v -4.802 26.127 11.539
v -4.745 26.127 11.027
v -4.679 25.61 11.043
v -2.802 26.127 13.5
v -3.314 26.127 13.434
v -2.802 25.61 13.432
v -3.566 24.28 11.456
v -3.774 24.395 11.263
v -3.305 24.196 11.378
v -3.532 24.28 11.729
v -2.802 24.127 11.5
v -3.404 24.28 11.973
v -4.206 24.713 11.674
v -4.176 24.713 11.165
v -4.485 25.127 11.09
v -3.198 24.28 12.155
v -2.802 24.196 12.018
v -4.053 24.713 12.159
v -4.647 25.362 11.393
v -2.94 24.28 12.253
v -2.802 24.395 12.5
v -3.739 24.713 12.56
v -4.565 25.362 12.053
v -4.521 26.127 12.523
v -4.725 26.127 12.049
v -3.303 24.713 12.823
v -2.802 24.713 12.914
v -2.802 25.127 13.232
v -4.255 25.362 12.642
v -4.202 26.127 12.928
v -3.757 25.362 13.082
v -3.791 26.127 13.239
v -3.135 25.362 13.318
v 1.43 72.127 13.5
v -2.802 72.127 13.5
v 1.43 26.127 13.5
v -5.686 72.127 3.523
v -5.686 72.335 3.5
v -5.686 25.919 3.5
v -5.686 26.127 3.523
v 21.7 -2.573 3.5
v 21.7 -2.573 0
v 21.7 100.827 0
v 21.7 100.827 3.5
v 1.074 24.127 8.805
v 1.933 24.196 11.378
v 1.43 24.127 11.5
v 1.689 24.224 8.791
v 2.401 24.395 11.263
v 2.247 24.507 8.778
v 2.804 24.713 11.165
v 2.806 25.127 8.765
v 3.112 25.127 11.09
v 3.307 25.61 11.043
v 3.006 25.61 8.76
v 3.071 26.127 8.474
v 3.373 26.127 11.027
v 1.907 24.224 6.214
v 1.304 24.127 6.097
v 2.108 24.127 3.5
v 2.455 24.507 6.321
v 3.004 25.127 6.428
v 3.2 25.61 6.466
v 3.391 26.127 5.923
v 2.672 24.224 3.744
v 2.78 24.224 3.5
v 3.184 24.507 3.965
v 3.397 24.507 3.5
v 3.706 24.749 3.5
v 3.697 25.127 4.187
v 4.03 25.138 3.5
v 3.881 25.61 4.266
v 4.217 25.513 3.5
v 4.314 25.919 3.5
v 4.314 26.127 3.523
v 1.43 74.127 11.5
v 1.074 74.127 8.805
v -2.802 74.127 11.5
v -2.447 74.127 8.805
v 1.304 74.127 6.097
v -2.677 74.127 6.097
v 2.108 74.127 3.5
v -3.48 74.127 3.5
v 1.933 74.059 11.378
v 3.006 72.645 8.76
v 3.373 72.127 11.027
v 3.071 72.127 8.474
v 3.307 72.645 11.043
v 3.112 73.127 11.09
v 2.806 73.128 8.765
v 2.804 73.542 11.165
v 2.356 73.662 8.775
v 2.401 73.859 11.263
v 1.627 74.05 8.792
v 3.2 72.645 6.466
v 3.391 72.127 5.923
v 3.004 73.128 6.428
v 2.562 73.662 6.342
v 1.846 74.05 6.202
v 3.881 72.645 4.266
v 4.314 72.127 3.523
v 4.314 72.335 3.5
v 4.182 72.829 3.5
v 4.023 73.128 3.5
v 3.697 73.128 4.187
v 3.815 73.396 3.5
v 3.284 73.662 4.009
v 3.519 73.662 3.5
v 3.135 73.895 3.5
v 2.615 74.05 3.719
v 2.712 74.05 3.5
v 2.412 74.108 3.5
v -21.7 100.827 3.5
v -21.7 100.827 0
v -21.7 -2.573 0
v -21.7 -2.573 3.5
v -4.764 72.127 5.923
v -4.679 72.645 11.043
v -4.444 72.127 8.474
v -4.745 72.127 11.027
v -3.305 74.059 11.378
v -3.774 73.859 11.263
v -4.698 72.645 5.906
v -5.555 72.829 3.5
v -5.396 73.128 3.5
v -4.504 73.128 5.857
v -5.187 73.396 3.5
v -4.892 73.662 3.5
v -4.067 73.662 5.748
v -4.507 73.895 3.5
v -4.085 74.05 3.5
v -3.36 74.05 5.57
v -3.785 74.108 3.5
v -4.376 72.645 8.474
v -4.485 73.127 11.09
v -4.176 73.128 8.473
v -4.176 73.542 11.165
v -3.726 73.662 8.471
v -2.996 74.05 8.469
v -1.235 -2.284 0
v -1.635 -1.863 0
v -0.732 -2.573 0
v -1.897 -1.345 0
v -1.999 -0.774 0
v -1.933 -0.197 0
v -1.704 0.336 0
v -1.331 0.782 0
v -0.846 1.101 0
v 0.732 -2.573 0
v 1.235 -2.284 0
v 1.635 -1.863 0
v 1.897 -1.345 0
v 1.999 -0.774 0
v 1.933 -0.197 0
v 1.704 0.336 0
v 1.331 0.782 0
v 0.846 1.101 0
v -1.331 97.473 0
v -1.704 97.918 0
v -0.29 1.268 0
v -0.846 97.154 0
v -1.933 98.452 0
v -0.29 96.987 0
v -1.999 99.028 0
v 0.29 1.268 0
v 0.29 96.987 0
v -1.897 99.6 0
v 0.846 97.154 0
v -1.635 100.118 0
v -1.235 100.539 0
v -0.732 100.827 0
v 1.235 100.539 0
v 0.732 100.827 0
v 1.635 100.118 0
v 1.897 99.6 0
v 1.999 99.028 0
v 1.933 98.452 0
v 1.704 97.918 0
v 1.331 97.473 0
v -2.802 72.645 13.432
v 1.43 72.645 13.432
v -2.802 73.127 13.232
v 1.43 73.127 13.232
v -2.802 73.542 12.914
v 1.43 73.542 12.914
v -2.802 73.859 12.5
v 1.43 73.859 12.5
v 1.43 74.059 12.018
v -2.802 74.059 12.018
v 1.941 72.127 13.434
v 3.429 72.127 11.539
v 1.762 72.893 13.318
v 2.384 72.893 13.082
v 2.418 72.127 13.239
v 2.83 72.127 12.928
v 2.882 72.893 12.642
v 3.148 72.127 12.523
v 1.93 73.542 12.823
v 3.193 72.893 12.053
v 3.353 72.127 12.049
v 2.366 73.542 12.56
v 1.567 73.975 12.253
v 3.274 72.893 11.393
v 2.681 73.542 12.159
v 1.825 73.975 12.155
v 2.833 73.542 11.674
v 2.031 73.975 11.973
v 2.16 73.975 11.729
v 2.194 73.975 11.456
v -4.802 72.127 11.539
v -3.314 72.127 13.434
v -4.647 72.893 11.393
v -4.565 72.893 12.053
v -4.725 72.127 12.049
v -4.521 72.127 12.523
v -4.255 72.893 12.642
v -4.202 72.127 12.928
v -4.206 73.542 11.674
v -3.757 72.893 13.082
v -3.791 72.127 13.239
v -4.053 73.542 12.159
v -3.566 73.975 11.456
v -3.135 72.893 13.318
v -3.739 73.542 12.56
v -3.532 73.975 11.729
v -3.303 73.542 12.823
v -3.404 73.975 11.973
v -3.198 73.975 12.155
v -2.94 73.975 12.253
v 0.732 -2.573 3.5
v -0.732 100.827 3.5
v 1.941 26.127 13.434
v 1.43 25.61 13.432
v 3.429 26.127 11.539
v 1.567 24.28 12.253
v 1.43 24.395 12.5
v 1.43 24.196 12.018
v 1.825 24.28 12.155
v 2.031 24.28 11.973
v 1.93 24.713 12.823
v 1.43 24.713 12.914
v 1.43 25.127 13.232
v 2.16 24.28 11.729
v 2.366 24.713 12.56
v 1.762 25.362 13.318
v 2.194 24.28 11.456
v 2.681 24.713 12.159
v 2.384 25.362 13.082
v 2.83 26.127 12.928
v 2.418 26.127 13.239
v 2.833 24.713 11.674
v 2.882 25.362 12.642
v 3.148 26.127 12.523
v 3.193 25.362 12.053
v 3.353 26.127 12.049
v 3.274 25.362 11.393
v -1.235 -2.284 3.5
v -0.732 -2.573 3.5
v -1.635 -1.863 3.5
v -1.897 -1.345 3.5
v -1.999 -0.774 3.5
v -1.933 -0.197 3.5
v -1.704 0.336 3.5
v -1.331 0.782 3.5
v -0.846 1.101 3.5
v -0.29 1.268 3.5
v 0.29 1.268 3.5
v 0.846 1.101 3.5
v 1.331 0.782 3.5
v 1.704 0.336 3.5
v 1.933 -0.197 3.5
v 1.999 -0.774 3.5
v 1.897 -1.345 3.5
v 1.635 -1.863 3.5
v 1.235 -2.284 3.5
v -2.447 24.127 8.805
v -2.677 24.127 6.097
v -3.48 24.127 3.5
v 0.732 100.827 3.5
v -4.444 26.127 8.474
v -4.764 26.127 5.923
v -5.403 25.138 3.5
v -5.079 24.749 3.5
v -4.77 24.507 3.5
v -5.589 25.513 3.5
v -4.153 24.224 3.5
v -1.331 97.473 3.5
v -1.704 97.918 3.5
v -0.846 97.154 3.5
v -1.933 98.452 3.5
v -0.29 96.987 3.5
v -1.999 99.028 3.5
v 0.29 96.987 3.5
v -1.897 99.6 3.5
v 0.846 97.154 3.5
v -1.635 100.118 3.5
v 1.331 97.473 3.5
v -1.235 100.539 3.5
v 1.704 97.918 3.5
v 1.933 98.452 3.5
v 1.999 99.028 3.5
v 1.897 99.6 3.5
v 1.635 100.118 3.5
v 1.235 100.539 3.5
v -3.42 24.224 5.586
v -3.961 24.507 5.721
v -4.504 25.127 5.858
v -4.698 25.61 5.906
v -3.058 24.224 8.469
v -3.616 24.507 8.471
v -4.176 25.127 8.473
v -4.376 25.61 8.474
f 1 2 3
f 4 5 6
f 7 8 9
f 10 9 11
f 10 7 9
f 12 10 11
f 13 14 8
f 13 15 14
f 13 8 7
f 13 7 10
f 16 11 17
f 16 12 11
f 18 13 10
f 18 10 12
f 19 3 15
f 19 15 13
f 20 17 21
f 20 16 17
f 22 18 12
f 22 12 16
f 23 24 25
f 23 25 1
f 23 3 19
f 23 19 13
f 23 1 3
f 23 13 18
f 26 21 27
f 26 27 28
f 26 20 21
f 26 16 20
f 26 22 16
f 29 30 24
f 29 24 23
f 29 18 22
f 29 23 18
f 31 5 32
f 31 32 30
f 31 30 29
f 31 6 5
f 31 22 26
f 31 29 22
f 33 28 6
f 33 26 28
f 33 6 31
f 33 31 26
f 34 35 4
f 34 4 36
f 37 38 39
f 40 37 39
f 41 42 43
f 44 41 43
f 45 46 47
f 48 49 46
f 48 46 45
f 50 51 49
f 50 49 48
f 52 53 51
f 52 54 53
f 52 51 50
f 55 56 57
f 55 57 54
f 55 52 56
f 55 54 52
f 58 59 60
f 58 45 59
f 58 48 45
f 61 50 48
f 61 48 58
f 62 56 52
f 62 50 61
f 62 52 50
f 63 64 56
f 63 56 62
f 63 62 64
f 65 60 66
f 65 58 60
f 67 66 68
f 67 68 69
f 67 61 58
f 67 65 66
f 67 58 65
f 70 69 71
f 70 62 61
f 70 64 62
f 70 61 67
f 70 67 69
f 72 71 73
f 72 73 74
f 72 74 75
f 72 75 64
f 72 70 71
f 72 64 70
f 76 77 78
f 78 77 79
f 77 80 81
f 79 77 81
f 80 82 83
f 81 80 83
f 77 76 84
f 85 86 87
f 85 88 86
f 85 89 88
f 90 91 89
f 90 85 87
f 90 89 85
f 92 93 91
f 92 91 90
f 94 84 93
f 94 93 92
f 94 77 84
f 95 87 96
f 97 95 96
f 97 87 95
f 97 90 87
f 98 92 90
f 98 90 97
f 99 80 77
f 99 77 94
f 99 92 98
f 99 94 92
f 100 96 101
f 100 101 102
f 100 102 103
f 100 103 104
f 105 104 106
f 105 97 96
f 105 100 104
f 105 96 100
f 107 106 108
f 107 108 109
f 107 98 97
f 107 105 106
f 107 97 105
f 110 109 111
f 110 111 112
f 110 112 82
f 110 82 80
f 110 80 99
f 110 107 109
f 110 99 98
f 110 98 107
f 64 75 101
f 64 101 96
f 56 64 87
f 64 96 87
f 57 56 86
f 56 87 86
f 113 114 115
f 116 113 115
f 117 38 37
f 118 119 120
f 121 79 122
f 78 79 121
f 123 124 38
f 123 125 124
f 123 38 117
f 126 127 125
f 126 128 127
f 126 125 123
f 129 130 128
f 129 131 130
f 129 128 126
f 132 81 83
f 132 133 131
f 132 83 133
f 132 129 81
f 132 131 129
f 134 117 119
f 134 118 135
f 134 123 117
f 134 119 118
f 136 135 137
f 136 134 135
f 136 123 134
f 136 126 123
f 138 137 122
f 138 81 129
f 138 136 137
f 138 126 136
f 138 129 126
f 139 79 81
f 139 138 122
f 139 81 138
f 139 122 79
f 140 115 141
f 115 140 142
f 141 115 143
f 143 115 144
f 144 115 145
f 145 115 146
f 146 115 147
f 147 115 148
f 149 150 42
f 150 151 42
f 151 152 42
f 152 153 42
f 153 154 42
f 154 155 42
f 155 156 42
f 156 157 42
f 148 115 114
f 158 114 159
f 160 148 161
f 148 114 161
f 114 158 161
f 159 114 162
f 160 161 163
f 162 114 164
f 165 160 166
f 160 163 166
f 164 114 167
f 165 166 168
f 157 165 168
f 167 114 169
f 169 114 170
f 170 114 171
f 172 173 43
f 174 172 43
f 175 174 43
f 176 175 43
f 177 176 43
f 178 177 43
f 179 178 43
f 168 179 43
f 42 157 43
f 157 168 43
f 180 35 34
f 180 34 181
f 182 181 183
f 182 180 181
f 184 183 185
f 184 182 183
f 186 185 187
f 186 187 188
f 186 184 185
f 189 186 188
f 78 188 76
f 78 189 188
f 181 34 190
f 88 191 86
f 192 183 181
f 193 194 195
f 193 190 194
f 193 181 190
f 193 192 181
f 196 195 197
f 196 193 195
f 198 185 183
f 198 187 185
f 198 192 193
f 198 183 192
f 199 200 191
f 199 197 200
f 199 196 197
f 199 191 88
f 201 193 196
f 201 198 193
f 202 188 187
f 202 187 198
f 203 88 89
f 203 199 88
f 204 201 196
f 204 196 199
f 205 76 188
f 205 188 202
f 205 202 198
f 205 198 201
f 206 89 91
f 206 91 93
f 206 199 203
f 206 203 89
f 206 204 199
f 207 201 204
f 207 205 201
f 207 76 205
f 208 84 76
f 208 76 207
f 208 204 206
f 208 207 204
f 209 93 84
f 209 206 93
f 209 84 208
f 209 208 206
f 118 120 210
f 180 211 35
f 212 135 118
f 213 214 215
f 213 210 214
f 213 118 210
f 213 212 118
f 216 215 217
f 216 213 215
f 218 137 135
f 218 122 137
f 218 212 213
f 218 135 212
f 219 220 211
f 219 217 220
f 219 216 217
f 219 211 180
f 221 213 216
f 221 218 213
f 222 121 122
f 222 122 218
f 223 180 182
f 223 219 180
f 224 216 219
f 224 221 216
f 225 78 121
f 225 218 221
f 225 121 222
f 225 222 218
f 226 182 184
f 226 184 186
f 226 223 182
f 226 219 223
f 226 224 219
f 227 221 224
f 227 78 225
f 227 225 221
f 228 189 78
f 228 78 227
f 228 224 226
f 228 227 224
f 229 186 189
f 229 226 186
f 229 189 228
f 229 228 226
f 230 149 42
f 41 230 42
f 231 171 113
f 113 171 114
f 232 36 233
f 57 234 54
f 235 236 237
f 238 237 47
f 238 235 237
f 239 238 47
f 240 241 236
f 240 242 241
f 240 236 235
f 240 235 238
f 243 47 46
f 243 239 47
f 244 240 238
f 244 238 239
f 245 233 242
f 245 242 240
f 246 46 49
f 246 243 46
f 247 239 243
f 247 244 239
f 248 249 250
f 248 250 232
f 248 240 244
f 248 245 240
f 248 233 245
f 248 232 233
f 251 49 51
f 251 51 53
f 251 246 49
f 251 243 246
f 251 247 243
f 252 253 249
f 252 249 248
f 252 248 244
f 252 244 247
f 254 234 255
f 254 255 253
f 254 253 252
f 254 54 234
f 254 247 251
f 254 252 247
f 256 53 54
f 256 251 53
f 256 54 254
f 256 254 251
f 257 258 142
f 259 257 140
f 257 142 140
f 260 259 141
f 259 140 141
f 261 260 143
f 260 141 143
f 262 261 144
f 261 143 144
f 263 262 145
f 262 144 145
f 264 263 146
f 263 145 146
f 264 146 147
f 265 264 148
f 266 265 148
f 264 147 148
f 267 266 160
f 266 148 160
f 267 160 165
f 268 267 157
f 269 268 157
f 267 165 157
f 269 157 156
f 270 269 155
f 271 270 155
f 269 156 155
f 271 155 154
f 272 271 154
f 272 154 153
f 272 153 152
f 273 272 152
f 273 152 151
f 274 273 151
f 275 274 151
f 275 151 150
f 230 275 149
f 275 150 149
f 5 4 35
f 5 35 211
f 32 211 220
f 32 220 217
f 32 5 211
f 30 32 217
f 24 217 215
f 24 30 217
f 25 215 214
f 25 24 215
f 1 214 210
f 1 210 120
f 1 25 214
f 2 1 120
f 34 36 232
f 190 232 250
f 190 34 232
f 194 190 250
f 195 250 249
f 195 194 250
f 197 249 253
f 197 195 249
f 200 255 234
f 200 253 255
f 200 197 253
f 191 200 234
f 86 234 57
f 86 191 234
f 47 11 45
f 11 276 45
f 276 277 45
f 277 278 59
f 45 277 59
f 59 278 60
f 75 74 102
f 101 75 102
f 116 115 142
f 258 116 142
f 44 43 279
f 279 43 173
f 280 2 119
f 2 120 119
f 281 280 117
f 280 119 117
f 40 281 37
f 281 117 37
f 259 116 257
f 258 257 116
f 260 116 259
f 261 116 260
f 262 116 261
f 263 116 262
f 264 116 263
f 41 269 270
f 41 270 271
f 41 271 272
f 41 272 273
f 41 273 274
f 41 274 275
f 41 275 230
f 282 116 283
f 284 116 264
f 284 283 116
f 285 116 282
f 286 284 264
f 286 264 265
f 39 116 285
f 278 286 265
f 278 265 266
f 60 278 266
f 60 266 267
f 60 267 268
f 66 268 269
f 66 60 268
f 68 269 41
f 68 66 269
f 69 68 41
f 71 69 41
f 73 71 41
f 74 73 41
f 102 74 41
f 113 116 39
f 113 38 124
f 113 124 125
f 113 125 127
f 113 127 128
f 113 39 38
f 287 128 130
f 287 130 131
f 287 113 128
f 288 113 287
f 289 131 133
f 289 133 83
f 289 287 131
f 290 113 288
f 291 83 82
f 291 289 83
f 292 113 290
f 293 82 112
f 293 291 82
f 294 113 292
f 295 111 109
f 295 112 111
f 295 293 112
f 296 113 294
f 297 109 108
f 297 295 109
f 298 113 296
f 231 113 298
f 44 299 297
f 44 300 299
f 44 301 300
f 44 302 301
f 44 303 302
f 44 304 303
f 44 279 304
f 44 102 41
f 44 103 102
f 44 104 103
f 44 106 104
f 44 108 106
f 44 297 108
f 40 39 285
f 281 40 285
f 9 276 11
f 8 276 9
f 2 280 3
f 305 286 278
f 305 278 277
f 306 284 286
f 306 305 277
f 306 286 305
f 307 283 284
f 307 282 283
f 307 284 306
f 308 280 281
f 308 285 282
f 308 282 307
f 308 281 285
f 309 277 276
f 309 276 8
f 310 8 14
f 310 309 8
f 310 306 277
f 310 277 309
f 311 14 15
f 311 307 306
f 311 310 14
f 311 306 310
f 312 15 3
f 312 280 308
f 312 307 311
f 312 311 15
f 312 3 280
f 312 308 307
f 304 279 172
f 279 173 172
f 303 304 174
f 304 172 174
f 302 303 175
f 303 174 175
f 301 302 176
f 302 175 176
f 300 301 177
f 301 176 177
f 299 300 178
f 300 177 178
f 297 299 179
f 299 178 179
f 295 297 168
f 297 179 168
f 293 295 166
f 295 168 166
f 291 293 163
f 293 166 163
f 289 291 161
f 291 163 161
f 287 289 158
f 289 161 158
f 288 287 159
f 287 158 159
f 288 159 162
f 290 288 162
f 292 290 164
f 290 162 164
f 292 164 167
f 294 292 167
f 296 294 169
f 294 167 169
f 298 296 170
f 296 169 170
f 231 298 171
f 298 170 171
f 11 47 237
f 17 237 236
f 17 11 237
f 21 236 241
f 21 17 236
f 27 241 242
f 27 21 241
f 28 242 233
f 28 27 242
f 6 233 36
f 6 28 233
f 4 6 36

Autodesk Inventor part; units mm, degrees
ref_plane "YZ Plane" through (0, 0, 0) normal (1, 0, 0) x (0, 1, 0)
ref_plane "XZ Plane" through (0, 0, 0) normal (0, 1, 0) x (-1, 0, 0)
ref_plane "XY Plane" through (0, 0, 0) normal (0, 0, 1) x (1, 0, 0)
sketch "Эскиз1" plane through (0, 0, 0) normal (0, 0, 1) x (1, 0, 0)
  circle A0 centre (0, 98.9661) radius 2 projected
  circle A1 centre (0, -0.7112) radius 2 projected
  line L0 (-22, 101.1274) -> (22, 101.1274) projected
  line L1 (22, 101.1274) -> (22, -2.8726) projected
  line L2 (22, -2.8726) -> (-22, -2.8726) projected
  line L3 (-22, -2.8726) -> (-22, 101.1274) projected
  line L4 (21.7, 100.8274) -> (-21.7, 100.8274)
  line L5 (-21.7, 100.8274) -> (-21.7, -2.5726)
  line L6 (-21.7, -2.5726) -> (21.7, -2.5726)
  line L7 (21.7, -2.5726) -> (21.7, 100.8274)
  point P0 (0, 0)
  point P1 (-0.7318, -2.5726)
  point P2 (0.7318, -2.5726)
  point P3 (0.7318, 100.8274)
  point P4 (-0.7318, 100.8274)
  dimension "d0" = 0.3
  dimension "d1" = 0.3
  dimension "d2" = 0.3
  dimension "d3" = 0.3
extrude "Выдавливание1" add sketch "Эскиз1" along normal blind 3.5 contours A0 L4 L7 L6 A1 L5
sketch "Эскиз2" plane through (0, 0, 3.5) normal (0, 0, 1) x (1, 0, 0)
  line L0 (-21.7, -2.5726) -> (-0.7318, -2.5726) projected
  arc A0 (0.7318, -2.5726) -> (-0.7318, -2.5726) centre (0, -0.7112) ccw projected
  line L1 (0.7318, -2.5726) -> (21.7, -2.5726) projected
  line L2 (21.7, -2.5726) -> (21.7, 100.8274) projected
  line L3 (21.7, 100.8274) -> (0.7318, 100.8274) projected
  arc A1 (-0.7318, 100.8274) -> (0.7318, 100.8274) centre (0, 98.9661) ccw projected
  line L4 (-0.7318, 100.8274) -> (-21.7, 100.8274) projected
  line L5 (-21.7, 100.8274) -> (-21.7, -2.5726) projected
  arc A2 (-0.7318, 100.8274) -> (0.7318, 100.8274) centre (0, 98.9661) ccw projected
  arc A3 (0.7318, -2.5726) -> (-0.7318, -2.5726) centre (0, -0.7112) ccw projected
  line L6 (0, 98.9661) -> (0, -0.7112)
  line L7 (4.3137, 74.1274) -> (-5.6863, 74.1274)
  line L8 (-5.6863, 74.1274) -> (-5.6863, 24.1274)
  line L9 (-5.6863, 24.1274) -> (4.3137, 24.1274)
  line L10 (4.3137, 24.1274) -> (4.3137, 74.1274)
  point P0 (0, 0)
  dimension "d6" = 10
  dimension "d7" = 50
  dimension "d8" = 103.4
  dimension "d9" = 26.7
extrude "Выдавливание2" add sketch "Эскиз2" along normal blind 10 contours L9 L8 L7 L6 | L6 L7 L10 L9
sketch "Эскиз3" plane through (-5.6863, 74.1274, 3.5) normal (0, 1, 0) x (1, 0, 0)
  line L0 (0, 0) -> (0, -10) projected
  line L1 (4.9545, 0) -> (-16.0137, 0) projected
  arc A0 (0, -10) -> (-0.0123, 0) centre (-9.3916, -5.0116) ccw
  line L2 (10, -10) -> (0, -10) projected
  line L3 (5, -12.0906) -> (5, 6.7336) construction
  line L4 (7.6863, 0) -> (3.6863, 0) projected
  line L5 (10, 0) -> (10, -10)
  arc A1 (10.0123, 0) -> (10, -10) centre (19.3916, -5.0116) ccw
  point P0 (5.6863, 3.5)
  point P1 (6.418, 0)
  point P2 (0, -0.0232)
  point P3 (10, -0.0232)
extrude "Выдавливание3" cut sketch "Эскиз3" against normal blind 58.75 contours A1 L5 | A0 L0
fillet "Сопряжение1" radius 2 2 edges at (4.3137, 49.1274, 13.5) (-5.6863, 49.1274, 13.5)
fillet "Сопряжение2" radius 2 10 edges at (-4.5263, 74.1274, 7.1886) (-0.6863, 74.1274, 13.5) (3.0022, 74.1274, 12.7357) (3.1537, 74.1274, 7.1886) (-4.3748, 74.1274, 12.7357) (-0.6863, 24.1274, 13.5) (3.0022, 24.1274, 12.7357) (3.1537, 24.1274, 7.1886) (-4.5263, 24.1274, 7.1886) (-4.3748, 24.1274, 12.7357)
equation "\"d0\" = d1"
equation "\"d2\" = d0"
equation "\"d3\" = d0"
equation "\"d9\" = -0.5 * d7 + 0.5 * d8"
properties part number "battery_case_top"
